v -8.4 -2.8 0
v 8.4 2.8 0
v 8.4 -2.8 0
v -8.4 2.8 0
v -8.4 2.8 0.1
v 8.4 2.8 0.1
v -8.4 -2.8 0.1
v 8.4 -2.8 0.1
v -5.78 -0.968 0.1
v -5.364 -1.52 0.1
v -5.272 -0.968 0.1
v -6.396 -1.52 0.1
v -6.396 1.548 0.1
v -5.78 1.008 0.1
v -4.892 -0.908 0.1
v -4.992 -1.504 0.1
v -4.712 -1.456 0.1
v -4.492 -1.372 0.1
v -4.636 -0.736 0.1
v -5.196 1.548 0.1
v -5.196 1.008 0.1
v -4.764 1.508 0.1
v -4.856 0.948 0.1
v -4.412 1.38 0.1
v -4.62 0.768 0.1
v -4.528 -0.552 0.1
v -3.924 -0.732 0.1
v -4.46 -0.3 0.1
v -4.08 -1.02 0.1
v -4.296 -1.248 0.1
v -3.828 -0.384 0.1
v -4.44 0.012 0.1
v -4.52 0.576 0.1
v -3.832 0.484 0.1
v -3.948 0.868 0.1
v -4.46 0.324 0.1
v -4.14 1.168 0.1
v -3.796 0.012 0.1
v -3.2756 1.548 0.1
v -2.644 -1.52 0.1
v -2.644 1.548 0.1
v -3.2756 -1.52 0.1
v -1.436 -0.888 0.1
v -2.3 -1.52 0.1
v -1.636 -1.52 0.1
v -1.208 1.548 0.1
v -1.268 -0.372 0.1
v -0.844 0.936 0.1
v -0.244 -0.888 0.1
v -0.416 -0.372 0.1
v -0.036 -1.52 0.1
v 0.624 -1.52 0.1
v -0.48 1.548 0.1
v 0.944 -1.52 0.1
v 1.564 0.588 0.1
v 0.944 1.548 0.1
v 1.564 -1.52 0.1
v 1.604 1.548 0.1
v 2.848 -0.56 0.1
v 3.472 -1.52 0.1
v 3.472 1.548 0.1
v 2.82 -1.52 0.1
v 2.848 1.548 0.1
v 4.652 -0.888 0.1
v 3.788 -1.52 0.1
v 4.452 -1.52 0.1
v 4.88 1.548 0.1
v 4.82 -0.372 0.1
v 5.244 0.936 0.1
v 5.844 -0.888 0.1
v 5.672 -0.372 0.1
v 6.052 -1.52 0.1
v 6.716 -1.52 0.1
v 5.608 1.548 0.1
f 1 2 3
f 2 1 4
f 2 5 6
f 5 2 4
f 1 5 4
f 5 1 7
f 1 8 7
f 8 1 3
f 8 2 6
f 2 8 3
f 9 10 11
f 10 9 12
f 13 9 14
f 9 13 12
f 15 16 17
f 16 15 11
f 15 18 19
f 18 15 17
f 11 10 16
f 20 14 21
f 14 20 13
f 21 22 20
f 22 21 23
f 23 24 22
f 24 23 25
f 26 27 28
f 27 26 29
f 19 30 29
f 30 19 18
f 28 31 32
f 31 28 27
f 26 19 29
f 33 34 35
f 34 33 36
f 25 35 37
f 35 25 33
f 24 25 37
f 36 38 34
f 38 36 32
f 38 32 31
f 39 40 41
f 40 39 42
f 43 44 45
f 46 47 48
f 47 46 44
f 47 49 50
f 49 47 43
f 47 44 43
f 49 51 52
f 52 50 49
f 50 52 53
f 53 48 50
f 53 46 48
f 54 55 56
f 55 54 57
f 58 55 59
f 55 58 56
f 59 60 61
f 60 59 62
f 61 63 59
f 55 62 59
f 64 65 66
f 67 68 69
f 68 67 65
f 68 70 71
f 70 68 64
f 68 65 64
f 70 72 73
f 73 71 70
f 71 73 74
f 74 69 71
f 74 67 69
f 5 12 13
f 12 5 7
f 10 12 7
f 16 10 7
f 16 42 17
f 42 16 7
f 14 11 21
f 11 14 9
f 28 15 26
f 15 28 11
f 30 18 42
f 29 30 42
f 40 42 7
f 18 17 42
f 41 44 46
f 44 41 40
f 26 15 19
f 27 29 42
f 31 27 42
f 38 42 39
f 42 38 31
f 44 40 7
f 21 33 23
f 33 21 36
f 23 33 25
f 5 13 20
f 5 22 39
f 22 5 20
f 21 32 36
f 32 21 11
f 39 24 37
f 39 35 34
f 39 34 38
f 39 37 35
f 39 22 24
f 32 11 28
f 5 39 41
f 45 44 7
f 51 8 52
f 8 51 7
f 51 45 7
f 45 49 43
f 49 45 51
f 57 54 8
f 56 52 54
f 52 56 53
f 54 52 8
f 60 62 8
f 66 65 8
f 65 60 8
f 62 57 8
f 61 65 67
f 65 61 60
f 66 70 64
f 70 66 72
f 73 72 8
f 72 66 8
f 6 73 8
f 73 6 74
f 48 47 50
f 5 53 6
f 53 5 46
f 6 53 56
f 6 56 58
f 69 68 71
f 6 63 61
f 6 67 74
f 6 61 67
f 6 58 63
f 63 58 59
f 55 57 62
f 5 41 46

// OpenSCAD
// file: ../p/box5-12.scad
use <../lib.scad>
function ldraw_lib__box5_12() = [
// 0 Box with 5 Faces without Any Edges
// 0 Name: box5-12.dat
// 0 Author: Chris Dee [cwdee]
// 0 !LDRAW_ORG Primitive UPDATE 2009-02
// 0 !LICENSE Licensed under CC BY 2.0 and CC BY 4.0 : see CAreadme.txt
// 
// 0 BFC CERTIFY CCW
  [0,"BFC","CERTIFY"],
  [0,"BFC","CCW"],
// 
// 0 !HISTORY 2009-09-03 [PTadmin] Official Update 2009-02
// 
// 
// 4 16 1 1 1 1 1 -1 -1 1 -1 -1 1 1
  [4,16,1,1,1,1,1,-1,-1,1,-1,-1,1,1],
// 4 16 -1 0 1 1 0 1 1 1 1 -1 1 1
  [4,16,-1,0,1,1,0,1,1,1,1,-1,1,1],
// 4 16 -1 0 -1 -1 0 1 -1 1 1 -1 1 -1
  [4,16,-1,0,-1,-1,0,1,-1,1,1,-1,1,-1],
// 4 16 1 0 -1 -1 0 -1 -1 1 -1 1 1 -1
  [4,16,1,0,-1,-1,0,-1,-1,1,-1,1,1,-1],
// 4 16 1 0 1 1 0 -1 1 1 -1 1 1 1
  [4,16,1,0,1,1,0,-1,1,1,-1,1,1,1],
// 0
];
makepoly(ldraw_lib__box5_12(), line=0.2);
// main file
use <../lib.scad>
use <../p/box5-12.scad>
function ldraw_lib__820672f() = [
// 0 Sticker  0.7 x  2.1 with White "DIANA" on Transparent Background
// 0 Name: 820672f.dat
// 0 Author: Takeshi Takahashi [RainbowDolphin]
// 0 !LDRAW_ORG Part UPDATE 2022-04
// 0 !LICENSE Licensed under CC BY 2.0 and CC BY 4.0 : see CAreadme.txt
// 
// 0 BFC CERTIFY CCW
  [0,"BFC","CERTIFY"],
  [0,"BFC","CCW"],
// 
// 0 !KEYWORDS harbour, Seaport, Set 6541, ship
// 
// 0 !HISTORY 2022-07-18 [PTadmin] Official Update 2022-04
// 
// 
// 1 16 0 -0.25 0 21 0 0 0 0.25 0 0 0 7 box5-12.dat
  [1,16,0,-0.25,0,21,0,0,0,0.25,0,0,0,7, ldraw_lib__box5_12()],
// 0 BFC NOCLIP
  [0,"BFC","NOCLIP"],
// 4 15 -14.45 -0.25 -2.42 -15.99 -0.25 -3.8 -13.41 -0.25 -3.8 -13.18 -0.25 -2.42
  [4,15,-14.45,-0.25,-2.42,-15.99,-0.25,-3.8,-13.41,-0.25,-3.8,-13.18,-0.25,-2.42],
// 4 15 -15.99 -0.25 3.87 -15.99 -0.25 -3.8 -14.45 -0.25 -2.42 -14.45 -0.25 2.52
  [4,15,-15.99,-0.25,3.87,-15.99,-0.25,-3.8,-14.45,-0.25,-2.42,-14.45,-0.25,2.52],
// 4 15 -12.48 -0.25 -3.76 -11.78 -0.25 -3.64 -12.23 -0.25 -2.27 -13.18 -0.25 -2.42
  [4,15,-12.48,-0.25,-3.76,-11.78,-0.25,-3.64,-12.23,-0.25,-2.27,-13.18,-0.25,-2.42],
// 4 15 -11.23 -0.25 -3.43 -11.59 -0.25 -1.84 -12.23 -0.25 -2.27 -11.78 -0.25 -3.64
  [4,15,-11.23,-0.25,-3.43,-11.59,-0.25,-1.84,-12.23,-0.25,-2.27,-11.78,-0.25,-3.64],
// 3 15 -13.18 -0.25 -2.42 -13.41 -0.25 -3.8 -12.48 -0.25 -3.76
  [3,15,-13.18,-0.25,-2.42,-13.41,-0.25,-3.8,-12.48,-0.25,-3.76],
// 4 15 -14.45 -0.25 2.52 -12.99 -0.25 2.52 -12.99 -0.25 3.87 -15.99 -0.25 3.87
  [4,15,-14.45,-0.25,2.52,-12.99,-0.25,2.52,-12.99,-0.25,3.87,-15.99,-0.25,3.87],
// 4 15 -11.91 -0.25 3.77 -12.99 -0.25 3.87 -12.99 -0.25 2.52 -12.14 -0.25 2.37
  [4,15,-11.91,-0.25,3.77,-12.99,-0.25,3.87,-12.99,-0.25,2.52,-12.14,-0.25,2.37],
// 4 15 -11.03 -0.25 3.45 -11.91 -0.25 3.77 -12.14 -0.25 2.37 -11.55 -0.25 1.92
  [4,15,-11.03,-0.25,3.45,-11.91,-0.25,3.77,-12.14,-0.25,2.37,-11.55,-0.25,1.92],
// 4 15 -9.81 -0.25 -1.83 -11.15 -0.25 -0.75 -11.32 -0.25 -1.38 -10.2 -0.25 -2.55
  [4,15,-9.81,-0.25,-1.83,-11.15,-0.25,-0.75,-11.32,-0.25,-1.38,-10.2,-0.25,-2.55],
// 4 15 -11.59 -0.25 -1.84 -11.23 -0.25 -3.43 -10.74 -0.25 -3.12 -10.2 -0.25 -2.55
  [4,15,-11.59,-0.25,-1.84,-11.23,-0.25,-3.43,-10.74,-0.25,-3.12,-10.2,-0.25,-2.55],
// 4 15 -11.15 -0.25 -0.75 -9.81 -0.25 -1.83 -9.57 -0.25 -0.96 -11.1 -0.25 0.03
  [4,15,-11.15,-0.25,-0.75,-9.81,-0.25,-1.83,-9.57,-0.25,-0.96,-11.1,-0.25,0.03],
// 3 15 -11.32 -0.25 -1.38 -11.59 -0.25 -1.84 -10.2 -0.25 -2.55
  [3,15,-11.32,-0.25,-1.38,-11.59,-0.25,-1.84,-10.2,-0.25,-2.55],
// 4 15 -11.3 -0.25 1.44 -11.15 -0.25 0.81 -9.58 -0.25 1.21 -9.87 -0.25 2.17
  [4,15,-11.3,-0.25,1.44,-11.15,-0.25,0.81,-9.58,-0.25,1.21,-9.87,-0.25,2.17],
// 4 15 -11.55 -0.25 1.92 -11.3 -0.25 1.44 -9.87 -0.25 2.17 -10.35 -0.25 2.92
  [4,15,-11.55,-0.25,1.92,-11.3,-0.25,1.44,-9.87,-0.25,2.17,-10.35,-0.25,2.92],
// 3 15 -11.03 -0.25 3.45 -11.55 -0.25 1.92 -10.35 -0.25 2.92
  [3,15,-11.03,-0.25,3.45,-11.55,-0.25,1.92,-10.35,-0.25,2.92],
// 4 15 -11.15 -0.25 0.81 -11.1 -0.25 0.03 -9.49 -0.25 0.03 -9.58 -0.25 1.21
  [4,15,-11.15,-0.25,0.81,-11.1,-0.25,0.03,-9.49,-0.25,0.03,-9.58,-0.25,1.21],
// 3 15 -9.49 -0.25 0.03 -11.1 -0.25 0.03 -9.57 -0.25 -0.96
  [3,15,-9.49,-0.25,0.03,-11.1,-0.25,0.03,-9.57,-0.25,-0.96],
// 4 15 -8.189 -0.25 3.87 -8.189 -0.25 -3.8 -6.61 -0.25 -3.8 -6.61 -0.25 3.87
  [4,15,-8.189,-0.25,3.87,-8.189,-0.25,-3.8,-6.61,-0.25,-3.8,-6.61,-0.25,3.87],
// 3 15 -3.59 -0.25 -2.22 -5.75 -0.25 -3.8 -4.09 -0.25 -3.8
  [3,15,-3.59,-0.25,-2.22,-5.75,-0.25,-3.8,-4.09,-0.25,-3.8],
// 4 15 -3.02 -0.25 3.87 -5.75 -0.25 -3.8 -3.17 -0.25 -0.93 -2.11 -0.25 2.34
  [4,15,-3.02,-0.25,3.87,-5.75,-0.25,-3.8,-3.17,-0.25,-0.93,-2.11,-0.25,2.34],
// 4 15 -1.04 -0.25 -0.93 -3.17 -0.25 -0.93 -3.59 -0.25 -2.22 -0.61 -0.25 -2.22
  [4,15,-1.04,-0.25,-0.93,-3.17,-0.25,-0.93,-3.59,-0.25,-2.22,-0.61,-0.25,-2.22],
// 3 15 -3.17 -0.25 -0.93 -5.75 -0.25 -3.8 -3.59 -0.25 -2.22
  [3,15,-3.17,-0.25,-0.93,-5.75,-0.25,-3.8,-3.59,-0.25,-2.22],
// 3 15 -0.61 -0.25 -2.22 -0.09 -0.25 -3.8 1.56 -0.25 -3.8
  [3,15,-0.61,-0.25,-2.22,-0.09,-0.25,-3.8,1.56,-0.25,-3.8],
// 4 15 -1.04 -0.25 -0.93 -0.61 -0.25 -2.22 1.56 -0.25 -3.8 -1.2 -0.25 3.87
  [4,15,-1.04,-0.25,-0.93,-0.61,-0.25,-2.22,1.56,-0.25,-3.8,-1.2,-0.25,3.87],
// 3 15 -1.2 -0.25 3.87 -2.11 -0.25 2.34 -1.04 -0.25 -0.93
  [3,15,-1.2,-0.25,3.87,-2.11,-0.25,2.34,-1.04,-0.25,-0.93],
// 3 15 -1.2 -0.25 3.87 -3.02 -0.25 3.87 -2.11 -0.25 2.34
  [3,15,-1.2,-0.25,3.87,-3.02,-0.25,3.87,-2.11,-0.25,2.34],
// 4 15 2.36 -0.25 -3.8 3.91 -0.25 -3.8 3.91 -0.25 1.47 2.36 -0.25 3.87
  [4,15,2.36,-0.25,-3.8,3.91,-0.25,-3.8,3.91,-0.25,1.47,2.36,-0.25,3.87],
// 4 15 4.01 -0.25 3.87 2.36 -0.25 3.87 3.91 -0.25 1.47 7.12 -0.25 -1.4
  [4,15,4.01,-0.25,3.87,2.36,-0.25,3.87,3.91,-0.25,1.47,7.12,-0.25,-1.4],
// 4 15 7.12 -0.25 -1.4 7.05 -0.25 -3.8 8.68 -0.25 -3.8 8.68 -0.25 3.87
  [4,15,7.12,-0.25,-1.4,7.05,-0.25,-3.8,8.68,-0.25,-3.8,8.68,-0.25,3.87],
// 3 15 8.68 -0.25 3.87 7.12 -0.25 3.87 7.12 -0.25 -1.4
  [3,15,8.68,-0.25,3.87,7.12,-0.25,3.87,7.12,-0.25,-1.4],
// 3 15 3.91 -0.25 1.47 7.05 -0.25 -3.8 7.12 -0.25 -1.4
  [3,15,3.91,-0.25,1.47,7.05,-0.25,-3.8,7.12,-0.25,-1.4],
// 3 15 11.63 -0.25 -2.22 9.47 -0.25 -3.8 11.13 -0.25 -3.8
  [3,15,11.63,-0.25,-2.22,9.47,-0.25,-3.8,11.13,-0.25,-3.8],
// 4 15 12.2 -0.25 3.87 9.47 -0.25 -3.8 12.05 -0.25 -0.93 13.11 -0.25 2.34
  [4,15,12.2,-0.25,3.87,9.47,-0.25,-3.8,12.05,-0.25,-0.93,13.11,-0.25,2.34],
// 4 15 14.18 -0.25 -0.93 12.05 -0.25 -0.93 11.63 -0.25 -2.22 14.61 -0.25 -2.22
  [4,15,14.18,-0.25,-0.93,12.05,-0.25,-0.93,11.63,-0.25,-2.22,14.61,-0.25,-2.22],
// 3 15 12.05 -0.25 -0.93 9.47 -0.25 -3.8 11.63 -0.25 -2.22
  [3,15,12.05,-0.25,-0.93,9.47,-0.25,-3.8,11.63,-0.25,-2.22],
// 3 15 14.61 -0.25 -2.22 15.13 -0.25 -3.8 16.79 -0.25 -3.8
  [3,15,14.61,-0.25,-2.22,15.13,-0.25,-3.8,16.79,-0.25,-3.8],
// 4 15 14.18 -0.25 -0.93 14.61 -0.25 -2.22 16.79 -0.25 -3.8 14.02 -0.25 3.87
  [4,15,14.18,-0.25,-0.93,14.61,-0.25,-2.22,16.79,-0.25,-3.8,14.02,-0.25,3.87],
// 3 15 14.02 -0.25 3.87 13.11 -0.25 2.34 14.18 -0.25 -0.93
  [3,15,14.02,-0.25,3.87,13.11,-0.25,2.34,14.18,-0.25,-0.93],
// 3 15 14.02 -0.25 3.87 12.2 -0.25 3.87 13.11 -0.25 2.34
  [3,15,14.02,-0.25,3.87,12.2,-0.25,3.87,13.11,-0.25,2.34],
// 0 BFC CLIP
  [0,"BFC","CLIP"],
// 4 16 -21 -0.25 -7 -15.99 -0.25 -3.8 -15.99 -0.25 3.87 -21 -0.25 7
  [4,16,-21,-0.25,-7,-15.99,-0.25,-3.8,-15.99,-0.25,3.87,-21,-0.25,7],
// 3 16 -13.41 -0.25 -3.8 -15.99 -0.25 -3.8 -21 -0.25 -7
  [3,16,-13.41,-0.25,-3.8,-15.99,-0.25,-3.8,-21,-0.25,-7],
// 3 16 -12.48 -0.25 -3.76 -13.41 -0.25 -3.8 -21 -0.25 -7
  [3,16,-12.48,-0.25,-3.76,-13.41,-0.25,-3.8,-21,-0.25,-7],
// 4 16 -11.78 -0.25 -3.64 -12.48 -0.25 -3.76 -21 -0.25 -7 -8.189 -0.25 -3.8
  [4,16,-11.78,-0.25,-3.64,-12.48,-0.25,-3.76,-21,-0.25,-7,-8.189,-0.25,-3.8],
// 4 16 -14.45 -0.25 2.52 -14.45 -0.25 -2.42 -13.18 -0.25 -2.42 -12.99 -0.25 2.52
  [4,16,-14.45,-0.25,2.52,-14.45,-0.25,-2.42,-13.18,-0.25,-2.42,-12.99,-0.25,2.52],
// 4 16 -11.15 -0.25 -0.75 -13.18 -0.25 -2.42 -12.23 -0.25 -2.27 -11.32 -0.25 -1.38
  [4,16,-11.15,-0.25,-0.75,-13.18,-0.25,-2.42,-12.23,-0.25,-2.27,-11.32,-0.25,-1.38],
// 3 16 -10.74 -0.25 -3.12 -11.23 -0.25 -3.43 -8.189 -0.25 -3.8
  [3,16,-10.74,-0.25,-3.12,-11.23,-0.25,-3.43,-8.189,-0.25,-3.8],
// 3 16 -10.2 -0.25 -2.55 -10.74 -0.25 -3.12 -8.189 -0.25 -3.8
  [3,16,-10.2,-0.25,-2.55,-10.74,-0.25,-3.12,-8.189,-0.25,-3.8],
// 3 16 -6.61 -0.25 -3.8 -8.189 -0.25 -3.8 -21 -0.25 -7
  [3,16,-6.61,-0.25,-3.8,-8.189,-0.25,-3.8,-21,-0.25,-7],
// 3 16 -11.23 -0.25 -3.43 -11.78 -0.25 -3.64 -8.189 -0.25 -3.8
  [3,16,-11.23,-0.25,-3.43,-11.78,-0.25,-3.64,-8.189,-0.25,-3.8],
// 4 16 -6.61 -0.25 3.87 -6.61 -0.25 -3.8 -5.75 -0.25 -3.8 -3.02 -0.25 3.87
  [4,16,-6.61,-0.25,3.87,-6.61,-0.25,-3.8,-5.75,-0.25,-3.8,-3.02,-0.25,3.87],
// 3 16 -11.32 -0.25 -1.38 -12.23 -0.25 -2.27 -11.59 -0.25 -1.84
  [3,16,-11.32,-0.25,-1.38,-12.23,-0.25,-2.27,-11.59,-0.25,-1.84],
// 3 16 -9.81 -0.25 -1.83 -10.2 -0.25 -2.55 -8.189 -0.25 -3.8
  [3,16,-9.81,-0.25,-1.83,-10.2,-0.25,-2.55,-8.189,-0.25,-3.8],
// 3 16 -9.57 -0.25 -0.96 -9.81 -0.25 -1.83 -8.189 -0.25 -3.8
  [3,16,-9.57,-0.25,-0.96,-9.81,-0.25,-1.83,-8.189,-0.25,-3.8],
// 4 16 -9.49 -0.25 0.03 -9.57 -0.25 -0.96 -8.189 -0.25 -3.8 -8.189 -0.25 3.87
  [4,16,-9.49,-0.25,0.03,-9.57,-0.25,-0.96,-8.189,-0.25,-3.8,-8.189,-0.25,3.87],
// 3 16 -5.75 -0.25 -3.8 -6.61 -0.25 -3.8 -21 -0.25 -7
  [3,16,-5.75,-0.25,-3.8,-6.61,-0.25,-3.8,-21,-0.25,-7],
// 4 16 -11.3 -0.25 1.44 -12.14 -0.25 2.37 -12.99 -0.25 2.52 -11.15 -0.25 0.81
  [4,16,-11.3,-0.25,1.44,-12.14,-0.25,2.37,-12.99,-0.25,2.52,-11.15,-0.25,0.81],
// 3 16 -12.14 -0.25 2.37 -11.3 -0.25 1.44 -11.55 -0.25 1.92
  [3,16,-12.14,-0.25,2.37,-11.3,-0.25,1.44,-11.55,-0.25,1.92],
// 3 16 -21 -0.25 7 -15.99 -0.25 3.87 -12.99 -0.25 3.87
  [3,16,-21,-0.25,7,-15.99,-0.25,3.87,-12.99,-0.25,3.87],
// 4 16 -21 -0.25 7 -12.99 -0.25 3.87 -11.91 -0.25 3.77 -8.189 -0.25 3.87
  [4,16,-21,-0.25,7,-12.99,-0.25,3.87,-11.91,-0.25,3.77,-8.189,-0.25,3.87],
// 4 16 -12.99 -0.25 2.52 -13.18 -0.25 -2.42 -11.1 -0.25 0.03 -11.15 -0.25 0.81
  [4,16,-12.99,-0.25,2.52,-13.18,-0.25,-2.42,-11.1,-0.25,0.03,-11.15,-0.25,0.81],
// 3 16 -8.189 -0.25 3.87 -11.03 -0.25 3.45 -10.35 -0.25 2.92
  [3,16,-8.189,-0.25,3.87,-11.03,-0.25,3.45,-10.35,-0.25,2.92],
// 3 16 -8.189 -0.25 3.87 -9.87 -0.25 2.17 -9.58 -0.25 1.21
  [3,16,-8.189,-0.25,3.87,-9.87,-0.25,2.17,-9.58,-0.25,1.21],
// 3 16 -8.189 -0.25 3.87 -9.58 -0.25 1.21 -9.49 -0.25 0.03
  [3,16,-8.189,-0.25,3.87,-9.58,-0.25,1.21,-9.49,-0.25,0.03],
// 3 16 -8.189 -0.25 3.87 -10.35 -0.25 2.92 -9.87 -0.25 2.17
  [3,16,-8.189,-0.25,3.87,-10.35,-0.25,2.92,-9.87,-0.25,2.17],
// 3 16 -8.189 -0.25 3.87 -11.91 -0.25 3.77 -11.03 -0.25 3.45
  [3,16,-8.189,-0.25,3.87,-11.91,-0.25,3.77,-11.03,-0.25,3.45],
// 3 16 -11.1 -0.25 0.03 -13.18 -0.25 -2.42 -11.15 -0.25 -0.75
  [3,16,-11.1,-0.25,0.03,-13.18,-0.25,-2.42,-11.15,-0.25,-0.75],
// 3 16 -21 -0.25 7 -8.189 -0.25 3.87 -6.61 -0.25 3.87
  [3,16,-21,-0.25,7,-8.189,-0.25,3.87,-6.61,-0.25,3.87],
// 3 16 -4.09 -0.25 -3.8 -5.75 -0.25 -3.8 -21 -0.25 -7
  [3,16,-4.09,-0.25,-3.8,-5.75,-0.25,-3.8,-21,-0.25,-7],
// 4 16 21 -0.25 -7 1.56 -0.25 -3.8 -0.09 -0.25 -3.8 -21 -0.25 -7
  [4,16,21,-0.25,-7,1.56,-0.25,-3.8,-0.09,-0.25,-3.8,-21,-0.25,-7],
// 3 16 -0.09 -0.25 -3.8 -4.09 -0.25 -3.8 -21 -0.25 -7
  [3,16,-0.09,-0.25,-3.8,-4.09,-0.25,-3.8,-21,-0.25,-7],
// 4 16 -4.09 -0.25 -3.8 -0.09 -0.25 -3.8 -0.61 -0.25 -2.22 -3.59 -0.25 -2.22
  [4,16,-4.09,-0.25,-3.8,-0.09,-0.25,-3.8,-0.61,-0.25,-2.22,-3.59,-0.25,-2.22],
// 3 16 3.91 -0.25 -3.8 2.36 -0.25 -3.8 21 -0.25 -7
  [3,16,3.91,-0.25,-3.8,2.36,-0.25,-3.8,21,-0.25,-7],
// 4 16 1.56 -0.25 -3.8 2.36 -0.25 -3.8 2.36 -0.25 3.87 -1.2 -0.25 3.87
  [4,16,1.56,-0.25,-3.8,2.36,-0.25,-3.8,2.36,-0.25,3.87,-1.2,-0.25,3.87],
// 3 16 2.36 -0.25 -3.8 1.56 -0.25 -3.8 21 -0.25 -7
  [3,16,2.36,-0.25,-3.8,1.56,-0.25,-3.8,21,-0.25,-7],
// 3 16 8.68 -0.25 -3.8 7.05 -0.25 -3.8 21 -0.25 -7
  [3,16,8.68,-0.25,-3.8,7.05,-0.25,-3.8,21,-0.25,-7],
// 3 16 11.13 -0.25 -3.8 9.47 -0.25 -3.8 21 -0.25 -7
  [3,16,11.13,-0.25,-3.8,9.47,-0.25,-3.8,21,-0.25,-7],
// 3 16 9.47 -0.25 -3.8 8.68 -0.25 -3.8 21 -0.25 -7
  [3,16,9.47,-0.25,-3.8,8.68,-0.25,-3.8,21,-0.25,-7],
// 3 16 7.05 -0.25 -3.8 3.91 -0.25 -3.8 21 -0.25 -7
  [3,16,7.05,-0.25,-3.8,3.91,-0.25,-3.8,21,-0.25,-7],
// 4 16 8.68 -0.25 3.87 8.68 -0.25 -3.8 9.47 -0.25 -3.8 12.2 -0.25 3.87
  [4,16,8.68,-0.25,3.87,8.68,-0.25,-3.8,9.47,-0.25,-3.8,12.2,-0.25,3.87],
// 4 16 14.61 -0.25 -2.22 11.63 -0.25 -2.22 11.13 -0.25 -3.8 15.13 -0.25 -3.8
  [4,16,14.61,-0.25,-2.22,11.63,-0.25,-2.22,11.13,-0.25,-3.8,15.13,-0.25,-3.8],
// 3 16 16.79 -0.25 -3.8 15.13 -0.25 -3.8 21 -0.25 -7
  [3,16,16.79,-0.25,-3.8,15.13,-0.25,-3.8,21,-0.25,-7],
// 3 16 15.13 -0.25 -3.8 11.13 -0.25 -3.8 21 -0.25 -7
  [3,16,15.13,-0.25,-3.8,11.13,-0.25,-3.8,21,-0.25,-7],
// 4 16 16.79 -0.25 -3.8 21 -0.25 -7 21 -0.25 7 14.02 -0.25 3.87
  [4,16,16.79,-0.25,-3.8,21,-0.25,-7,21,-0.25,7,14.02,-0.25,3.87],
// 3 16 -2.11 -0.25 2.34 -3.17 -0.25 -0.93 -1.04 -0.25 -0.93
  [3,16,-2.11,-0.25,2.34,-3.17,-0.25,-0.93,-1.04,-0.25,-0.93],
// 4 16 -21 -0.25 7 -3.02 -0.25 3.87 -1.2 -0.25 3.87 21 -0.25 7
  [4,16,-21,-0.25,7,-3.02,-0.25,3.87,-1.2,-0.25,3.87,21,-0.25,7],
// 3 16 21 -0.25 7 -1.2 -0.25 3.87 2.36 -0.25 3.87
  [3,16,21,-0.25,7,-1.2,-0.25,3.87,2.36,-0.25,3.87],
// 3 16 21 -0.25 7 2.36 -0.25 3.87 4.01 -0.25 3.87
  [3,16,21,-0.25,7,2.36,-0.25,3.87,4.01,-0.25,3.87],
// 3 16 13.11 -0.25 2.34 12.05 -0.25 -0.93 14.18 -0.25 -0.93
  [3,16,13.11,-0.25,2.34,12.05,-0.25,-0.93,14.18,-0.25,-0.93],
// 3 16 21 -0.25 7 7.12 -0.25 3.87 8.68 -0.25 3.87
  [3,16,21,-0.25,7,7.12,-0.25,3.87,8.68,-0.25,3.87],
// 3 16 21 -0.25 7 12.2 -0.25 3.87 14.02 -0.25 3.87
  [3,16,21,-0.25,7,12.2,-0.25,3.87,14.02,-0.25,3.87],
// 3 16 21 -0.25 7 8.68 -0.25 3.87 12.2 -0.25 3.87
  [3,16,21,-0.25,7,8.68,-0.25,3.87,12.2,-0.25,3.87],
// 3 16 21 -0.25 7 4.01 -0.25 3.87 7.12 -0.25 3.87
  [3,16,21,-0.25,7,4.01,-0.25,3.87,7.12,-0.25,3.87],
// 3 16 7.12 -0.25 3.87 4.01 -0.25 3.87 7.12 -0.25 -1.4
  [3,16,7.12,-0.25,3.87,4.01,-0.25,3.87,7.12,-0.25,-1.4],
// 3 16 3.91 -0.25 1.47 3.91 -0.25 -3.8 7.05 -0.25 -3.8
  [3,16,3.91,-0.25,1.47,3.91,-0.25,-3.8,7.05,-0.25,-3.8],
// 3 16 -21 -0.25 7 -6.61 -0.25 3.87 -3.02 -0.25 3.87
  [3,16,-21,-0.25,7,-6.61,-0.25,3.87,-3.02,-0.25,3.87],
];
makepoly(ldraw_lib__820672f(), line=0.2);
